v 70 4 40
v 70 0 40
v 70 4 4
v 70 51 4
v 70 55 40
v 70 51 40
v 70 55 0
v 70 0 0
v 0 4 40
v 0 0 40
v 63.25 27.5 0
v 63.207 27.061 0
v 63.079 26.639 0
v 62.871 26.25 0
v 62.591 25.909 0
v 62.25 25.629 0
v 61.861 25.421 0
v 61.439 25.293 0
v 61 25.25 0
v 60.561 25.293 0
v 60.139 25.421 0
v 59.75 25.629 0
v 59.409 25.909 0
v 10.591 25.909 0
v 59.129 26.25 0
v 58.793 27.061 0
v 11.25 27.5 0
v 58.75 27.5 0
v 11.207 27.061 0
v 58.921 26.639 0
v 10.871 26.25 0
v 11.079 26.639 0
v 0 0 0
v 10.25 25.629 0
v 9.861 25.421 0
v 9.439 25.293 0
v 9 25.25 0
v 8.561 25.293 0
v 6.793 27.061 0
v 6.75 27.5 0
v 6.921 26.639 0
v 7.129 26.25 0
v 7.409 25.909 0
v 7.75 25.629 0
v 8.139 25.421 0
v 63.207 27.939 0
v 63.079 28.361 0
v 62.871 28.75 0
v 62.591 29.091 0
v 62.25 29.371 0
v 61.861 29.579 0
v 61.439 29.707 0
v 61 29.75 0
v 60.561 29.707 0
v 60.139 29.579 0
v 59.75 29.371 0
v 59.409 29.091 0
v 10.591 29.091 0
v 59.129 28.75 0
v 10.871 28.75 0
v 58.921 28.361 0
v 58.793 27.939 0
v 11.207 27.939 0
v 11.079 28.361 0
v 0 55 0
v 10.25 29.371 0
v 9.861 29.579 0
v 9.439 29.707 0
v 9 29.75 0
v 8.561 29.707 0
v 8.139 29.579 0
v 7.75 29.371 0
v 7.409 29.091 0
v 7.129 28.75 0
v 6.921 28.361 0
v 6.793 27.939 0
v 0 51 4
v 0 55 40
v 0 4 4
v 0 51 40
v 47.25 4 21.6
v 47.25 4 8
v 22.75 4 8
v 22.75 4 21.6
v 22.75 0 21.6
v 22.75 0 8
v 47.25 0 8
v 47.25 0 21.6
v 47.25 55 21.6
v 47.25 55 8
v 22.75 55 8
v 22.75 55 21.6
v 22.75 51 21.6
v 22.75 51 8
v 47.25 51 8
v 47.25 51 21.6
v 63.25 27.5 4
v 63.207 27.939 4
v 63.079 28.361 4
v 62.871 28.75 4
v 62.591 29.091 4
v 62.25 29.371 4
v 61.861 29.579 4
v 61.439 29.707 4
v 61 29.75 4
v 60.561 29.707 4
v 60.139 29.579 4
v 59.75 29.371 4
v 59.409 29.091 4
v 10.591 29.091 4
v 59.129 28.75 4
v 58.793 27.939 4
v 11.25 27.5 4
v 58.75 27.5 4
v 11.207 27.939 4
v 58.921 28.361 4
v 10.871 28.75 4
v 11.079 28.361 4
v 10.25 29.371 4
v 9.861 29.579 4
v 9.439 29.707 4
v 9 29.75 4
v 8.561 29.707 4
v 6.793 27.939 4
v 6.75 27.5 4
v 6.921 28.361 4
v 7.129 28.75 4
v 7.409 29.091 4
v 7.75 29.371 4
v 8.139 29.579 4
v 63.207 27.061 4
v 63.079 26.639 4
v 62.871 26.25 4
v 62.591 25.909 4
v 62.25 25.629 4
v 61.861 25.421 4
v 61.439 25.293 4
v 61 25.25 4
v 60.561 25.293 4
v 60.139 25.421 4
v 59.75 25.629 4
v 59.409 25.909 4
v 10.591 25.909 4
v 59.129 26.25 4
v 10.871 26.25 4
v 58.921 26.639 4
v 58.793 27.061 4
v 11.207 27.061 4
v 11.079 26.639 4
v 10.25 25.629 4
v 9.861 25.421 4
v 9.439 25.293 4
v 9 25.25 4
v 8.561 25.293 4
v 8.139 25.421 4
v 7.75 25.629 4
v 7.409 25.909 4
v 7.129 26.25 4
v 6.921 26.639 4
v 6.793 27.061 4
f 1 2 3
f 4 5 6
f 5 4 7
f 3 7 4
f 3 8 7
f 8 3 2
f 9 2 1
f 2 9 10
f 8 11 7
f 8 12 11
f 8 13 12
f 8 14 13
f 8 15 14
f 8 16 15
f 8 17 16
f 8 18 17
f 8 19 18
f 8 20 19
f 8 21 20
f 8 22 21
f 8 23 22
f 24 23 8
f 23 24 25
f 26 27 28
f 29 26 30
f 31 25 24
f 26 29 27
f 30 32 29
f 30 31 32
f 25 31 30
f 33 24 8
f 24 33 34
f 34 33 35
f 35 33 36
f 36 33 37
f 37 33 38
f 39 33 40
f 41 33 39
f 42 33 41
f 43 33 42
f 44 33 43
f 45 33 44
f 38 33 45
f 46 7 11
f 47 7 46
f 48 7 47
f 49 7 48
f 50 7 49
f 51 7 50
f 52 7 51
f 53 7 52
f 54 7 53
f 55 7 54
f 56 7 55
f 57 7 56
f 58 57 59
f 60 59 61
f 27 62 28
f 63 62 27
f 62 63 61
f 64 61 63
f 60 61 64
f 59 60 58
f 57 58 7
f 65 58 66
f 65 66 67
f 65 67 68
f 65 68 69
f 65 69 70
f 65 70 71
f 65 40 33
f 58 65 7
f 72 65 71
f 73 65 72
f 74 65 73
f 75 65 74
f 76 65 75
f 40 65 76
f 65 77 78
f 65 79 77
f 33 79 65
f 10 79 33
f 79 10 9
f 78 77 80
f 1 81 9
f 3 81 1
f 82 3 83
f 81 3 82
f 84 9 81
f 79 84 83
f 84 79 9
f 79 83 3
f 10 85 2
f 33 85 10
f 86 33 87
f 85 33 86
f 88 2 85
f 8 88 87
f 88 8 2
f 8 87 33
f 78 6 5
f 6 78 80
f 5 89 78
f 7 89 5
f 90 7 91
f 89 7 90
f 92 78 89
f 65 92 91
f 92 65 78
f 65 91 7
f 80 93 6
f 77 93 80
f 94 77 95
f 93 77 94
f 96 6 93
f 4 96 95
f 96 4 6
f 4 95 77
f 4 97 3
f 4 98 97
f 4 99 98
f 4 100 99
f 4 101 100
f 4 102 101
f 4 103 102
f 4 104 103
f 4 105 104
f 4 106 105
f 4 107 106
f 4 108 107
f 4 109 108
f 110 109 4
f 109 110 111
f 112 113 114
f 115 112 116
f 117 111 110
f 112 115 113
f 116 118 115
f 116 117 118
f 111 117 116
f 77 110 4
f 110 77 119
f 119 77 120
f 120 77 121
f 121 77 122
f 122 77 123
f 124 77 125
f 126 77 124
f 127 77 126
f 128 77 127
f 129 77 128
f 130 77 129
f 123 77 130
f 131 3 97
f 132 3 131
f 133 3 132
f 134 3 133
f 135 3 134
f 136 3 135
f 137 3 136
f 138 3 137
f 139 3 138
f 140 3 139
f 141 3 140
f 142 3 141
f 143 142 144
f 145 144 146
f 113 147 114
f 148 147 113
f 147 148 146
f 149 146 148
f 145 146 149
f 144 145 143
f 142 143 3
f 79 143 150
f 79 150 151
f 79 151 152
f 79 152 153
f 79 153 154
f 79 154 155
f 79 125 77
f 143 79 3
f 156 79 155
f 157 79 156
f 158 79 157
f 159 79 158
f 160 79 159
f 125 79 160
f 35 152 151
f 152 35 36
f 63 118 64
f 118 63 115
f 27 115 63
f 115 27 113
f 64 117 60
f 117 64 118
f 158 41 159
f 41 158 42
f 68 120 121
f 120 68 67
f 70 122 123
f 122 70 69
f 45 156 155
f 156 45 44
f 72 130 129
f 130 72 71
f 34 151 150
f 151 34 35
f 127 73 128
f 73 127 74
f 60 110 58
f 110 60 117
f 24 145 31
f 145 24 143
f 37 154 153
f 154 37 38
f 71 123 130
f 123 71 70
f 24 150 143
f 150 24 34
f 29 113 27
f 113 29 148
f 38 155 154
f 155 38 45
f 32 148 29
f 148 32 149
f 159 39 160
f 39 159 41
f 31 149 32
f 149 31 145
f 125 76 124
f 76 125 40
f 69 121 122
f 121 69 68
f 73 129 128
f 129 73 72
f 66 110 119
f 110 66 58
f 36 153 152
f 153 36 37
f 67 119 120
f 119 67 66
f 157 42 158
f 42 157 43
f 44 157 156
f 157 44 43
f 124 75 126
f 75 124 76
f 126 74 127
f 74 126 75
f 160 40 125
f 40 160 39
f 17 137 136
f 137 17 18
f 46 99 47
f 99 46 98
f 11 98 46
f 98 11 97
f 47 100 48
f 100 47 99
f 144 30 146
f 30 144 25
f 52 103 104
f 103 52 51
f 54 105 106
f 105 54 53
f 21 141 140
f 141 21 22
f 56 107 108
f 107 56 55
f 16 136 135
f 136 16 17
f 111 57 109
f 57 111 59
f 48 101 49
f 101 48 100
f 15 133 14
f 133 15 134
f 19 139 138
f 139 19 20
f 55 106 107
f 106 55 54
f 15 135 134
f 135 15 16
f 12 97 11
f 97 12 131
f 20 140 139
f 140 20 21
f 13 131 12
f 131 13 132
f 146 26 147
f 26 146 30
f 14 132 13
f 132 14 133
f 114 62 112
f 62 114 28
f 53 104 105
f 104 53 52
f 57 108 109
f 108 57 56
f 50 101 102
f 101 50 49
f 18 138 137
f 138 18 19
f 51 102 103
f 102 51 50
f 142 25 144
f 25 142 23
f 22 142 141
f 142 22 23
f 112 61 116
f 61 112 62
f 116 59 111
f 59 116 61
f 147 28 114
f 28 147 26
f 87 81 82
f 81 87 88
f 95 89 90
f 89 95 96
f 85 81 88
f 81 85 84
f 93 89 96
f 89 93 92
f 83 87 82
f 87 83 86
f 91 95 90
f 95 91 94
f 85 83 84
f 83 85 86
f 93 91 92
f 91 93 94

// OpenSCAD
$fn = 32;

// ----------------------------------------------------------------------
// U-bracket: 70 x 55 x 40 mm
// ----------------------------------------------------------------------

// --- parameters (mm) ---
length = 70;              // outer length, X
width = 55;               // outer width, Y
height = 40;              // upright height, Z
thick = 4;                // wall thickness
hole_d = 4.5;             // clearance for M4
window_l = 24.5;          // window length
window_h = 13.6;          // window height

module hole_z(px, py) {
  translate([px, py, -0.5]) cylinder(h = thick + 1, d = hole_d);
}
module hole_y_pz(pz) {
  /* through both uprights along Y */
  translate([0, -0.5, pz]) rotate([-90, 0, 0]) cylinder(h = width + 1, d = hole_d);
}

module base() {
  cube([length, width, thick]);
}

module uprights() {
  cube([length, thick, height]);
  translate([0, width - thick, 0]) cube([length, thick, height]);
}

difference() {
  union() {
    base();
    uprights();
  }
  hole_z(9, 27.5);
  hole_z(61, 27.5);
  /* lightening window through both uprights */
  translate([length / 2 - window_l / 2, -1, thick + 4])
    cube([window_l, width + 2, window_h]);
}
